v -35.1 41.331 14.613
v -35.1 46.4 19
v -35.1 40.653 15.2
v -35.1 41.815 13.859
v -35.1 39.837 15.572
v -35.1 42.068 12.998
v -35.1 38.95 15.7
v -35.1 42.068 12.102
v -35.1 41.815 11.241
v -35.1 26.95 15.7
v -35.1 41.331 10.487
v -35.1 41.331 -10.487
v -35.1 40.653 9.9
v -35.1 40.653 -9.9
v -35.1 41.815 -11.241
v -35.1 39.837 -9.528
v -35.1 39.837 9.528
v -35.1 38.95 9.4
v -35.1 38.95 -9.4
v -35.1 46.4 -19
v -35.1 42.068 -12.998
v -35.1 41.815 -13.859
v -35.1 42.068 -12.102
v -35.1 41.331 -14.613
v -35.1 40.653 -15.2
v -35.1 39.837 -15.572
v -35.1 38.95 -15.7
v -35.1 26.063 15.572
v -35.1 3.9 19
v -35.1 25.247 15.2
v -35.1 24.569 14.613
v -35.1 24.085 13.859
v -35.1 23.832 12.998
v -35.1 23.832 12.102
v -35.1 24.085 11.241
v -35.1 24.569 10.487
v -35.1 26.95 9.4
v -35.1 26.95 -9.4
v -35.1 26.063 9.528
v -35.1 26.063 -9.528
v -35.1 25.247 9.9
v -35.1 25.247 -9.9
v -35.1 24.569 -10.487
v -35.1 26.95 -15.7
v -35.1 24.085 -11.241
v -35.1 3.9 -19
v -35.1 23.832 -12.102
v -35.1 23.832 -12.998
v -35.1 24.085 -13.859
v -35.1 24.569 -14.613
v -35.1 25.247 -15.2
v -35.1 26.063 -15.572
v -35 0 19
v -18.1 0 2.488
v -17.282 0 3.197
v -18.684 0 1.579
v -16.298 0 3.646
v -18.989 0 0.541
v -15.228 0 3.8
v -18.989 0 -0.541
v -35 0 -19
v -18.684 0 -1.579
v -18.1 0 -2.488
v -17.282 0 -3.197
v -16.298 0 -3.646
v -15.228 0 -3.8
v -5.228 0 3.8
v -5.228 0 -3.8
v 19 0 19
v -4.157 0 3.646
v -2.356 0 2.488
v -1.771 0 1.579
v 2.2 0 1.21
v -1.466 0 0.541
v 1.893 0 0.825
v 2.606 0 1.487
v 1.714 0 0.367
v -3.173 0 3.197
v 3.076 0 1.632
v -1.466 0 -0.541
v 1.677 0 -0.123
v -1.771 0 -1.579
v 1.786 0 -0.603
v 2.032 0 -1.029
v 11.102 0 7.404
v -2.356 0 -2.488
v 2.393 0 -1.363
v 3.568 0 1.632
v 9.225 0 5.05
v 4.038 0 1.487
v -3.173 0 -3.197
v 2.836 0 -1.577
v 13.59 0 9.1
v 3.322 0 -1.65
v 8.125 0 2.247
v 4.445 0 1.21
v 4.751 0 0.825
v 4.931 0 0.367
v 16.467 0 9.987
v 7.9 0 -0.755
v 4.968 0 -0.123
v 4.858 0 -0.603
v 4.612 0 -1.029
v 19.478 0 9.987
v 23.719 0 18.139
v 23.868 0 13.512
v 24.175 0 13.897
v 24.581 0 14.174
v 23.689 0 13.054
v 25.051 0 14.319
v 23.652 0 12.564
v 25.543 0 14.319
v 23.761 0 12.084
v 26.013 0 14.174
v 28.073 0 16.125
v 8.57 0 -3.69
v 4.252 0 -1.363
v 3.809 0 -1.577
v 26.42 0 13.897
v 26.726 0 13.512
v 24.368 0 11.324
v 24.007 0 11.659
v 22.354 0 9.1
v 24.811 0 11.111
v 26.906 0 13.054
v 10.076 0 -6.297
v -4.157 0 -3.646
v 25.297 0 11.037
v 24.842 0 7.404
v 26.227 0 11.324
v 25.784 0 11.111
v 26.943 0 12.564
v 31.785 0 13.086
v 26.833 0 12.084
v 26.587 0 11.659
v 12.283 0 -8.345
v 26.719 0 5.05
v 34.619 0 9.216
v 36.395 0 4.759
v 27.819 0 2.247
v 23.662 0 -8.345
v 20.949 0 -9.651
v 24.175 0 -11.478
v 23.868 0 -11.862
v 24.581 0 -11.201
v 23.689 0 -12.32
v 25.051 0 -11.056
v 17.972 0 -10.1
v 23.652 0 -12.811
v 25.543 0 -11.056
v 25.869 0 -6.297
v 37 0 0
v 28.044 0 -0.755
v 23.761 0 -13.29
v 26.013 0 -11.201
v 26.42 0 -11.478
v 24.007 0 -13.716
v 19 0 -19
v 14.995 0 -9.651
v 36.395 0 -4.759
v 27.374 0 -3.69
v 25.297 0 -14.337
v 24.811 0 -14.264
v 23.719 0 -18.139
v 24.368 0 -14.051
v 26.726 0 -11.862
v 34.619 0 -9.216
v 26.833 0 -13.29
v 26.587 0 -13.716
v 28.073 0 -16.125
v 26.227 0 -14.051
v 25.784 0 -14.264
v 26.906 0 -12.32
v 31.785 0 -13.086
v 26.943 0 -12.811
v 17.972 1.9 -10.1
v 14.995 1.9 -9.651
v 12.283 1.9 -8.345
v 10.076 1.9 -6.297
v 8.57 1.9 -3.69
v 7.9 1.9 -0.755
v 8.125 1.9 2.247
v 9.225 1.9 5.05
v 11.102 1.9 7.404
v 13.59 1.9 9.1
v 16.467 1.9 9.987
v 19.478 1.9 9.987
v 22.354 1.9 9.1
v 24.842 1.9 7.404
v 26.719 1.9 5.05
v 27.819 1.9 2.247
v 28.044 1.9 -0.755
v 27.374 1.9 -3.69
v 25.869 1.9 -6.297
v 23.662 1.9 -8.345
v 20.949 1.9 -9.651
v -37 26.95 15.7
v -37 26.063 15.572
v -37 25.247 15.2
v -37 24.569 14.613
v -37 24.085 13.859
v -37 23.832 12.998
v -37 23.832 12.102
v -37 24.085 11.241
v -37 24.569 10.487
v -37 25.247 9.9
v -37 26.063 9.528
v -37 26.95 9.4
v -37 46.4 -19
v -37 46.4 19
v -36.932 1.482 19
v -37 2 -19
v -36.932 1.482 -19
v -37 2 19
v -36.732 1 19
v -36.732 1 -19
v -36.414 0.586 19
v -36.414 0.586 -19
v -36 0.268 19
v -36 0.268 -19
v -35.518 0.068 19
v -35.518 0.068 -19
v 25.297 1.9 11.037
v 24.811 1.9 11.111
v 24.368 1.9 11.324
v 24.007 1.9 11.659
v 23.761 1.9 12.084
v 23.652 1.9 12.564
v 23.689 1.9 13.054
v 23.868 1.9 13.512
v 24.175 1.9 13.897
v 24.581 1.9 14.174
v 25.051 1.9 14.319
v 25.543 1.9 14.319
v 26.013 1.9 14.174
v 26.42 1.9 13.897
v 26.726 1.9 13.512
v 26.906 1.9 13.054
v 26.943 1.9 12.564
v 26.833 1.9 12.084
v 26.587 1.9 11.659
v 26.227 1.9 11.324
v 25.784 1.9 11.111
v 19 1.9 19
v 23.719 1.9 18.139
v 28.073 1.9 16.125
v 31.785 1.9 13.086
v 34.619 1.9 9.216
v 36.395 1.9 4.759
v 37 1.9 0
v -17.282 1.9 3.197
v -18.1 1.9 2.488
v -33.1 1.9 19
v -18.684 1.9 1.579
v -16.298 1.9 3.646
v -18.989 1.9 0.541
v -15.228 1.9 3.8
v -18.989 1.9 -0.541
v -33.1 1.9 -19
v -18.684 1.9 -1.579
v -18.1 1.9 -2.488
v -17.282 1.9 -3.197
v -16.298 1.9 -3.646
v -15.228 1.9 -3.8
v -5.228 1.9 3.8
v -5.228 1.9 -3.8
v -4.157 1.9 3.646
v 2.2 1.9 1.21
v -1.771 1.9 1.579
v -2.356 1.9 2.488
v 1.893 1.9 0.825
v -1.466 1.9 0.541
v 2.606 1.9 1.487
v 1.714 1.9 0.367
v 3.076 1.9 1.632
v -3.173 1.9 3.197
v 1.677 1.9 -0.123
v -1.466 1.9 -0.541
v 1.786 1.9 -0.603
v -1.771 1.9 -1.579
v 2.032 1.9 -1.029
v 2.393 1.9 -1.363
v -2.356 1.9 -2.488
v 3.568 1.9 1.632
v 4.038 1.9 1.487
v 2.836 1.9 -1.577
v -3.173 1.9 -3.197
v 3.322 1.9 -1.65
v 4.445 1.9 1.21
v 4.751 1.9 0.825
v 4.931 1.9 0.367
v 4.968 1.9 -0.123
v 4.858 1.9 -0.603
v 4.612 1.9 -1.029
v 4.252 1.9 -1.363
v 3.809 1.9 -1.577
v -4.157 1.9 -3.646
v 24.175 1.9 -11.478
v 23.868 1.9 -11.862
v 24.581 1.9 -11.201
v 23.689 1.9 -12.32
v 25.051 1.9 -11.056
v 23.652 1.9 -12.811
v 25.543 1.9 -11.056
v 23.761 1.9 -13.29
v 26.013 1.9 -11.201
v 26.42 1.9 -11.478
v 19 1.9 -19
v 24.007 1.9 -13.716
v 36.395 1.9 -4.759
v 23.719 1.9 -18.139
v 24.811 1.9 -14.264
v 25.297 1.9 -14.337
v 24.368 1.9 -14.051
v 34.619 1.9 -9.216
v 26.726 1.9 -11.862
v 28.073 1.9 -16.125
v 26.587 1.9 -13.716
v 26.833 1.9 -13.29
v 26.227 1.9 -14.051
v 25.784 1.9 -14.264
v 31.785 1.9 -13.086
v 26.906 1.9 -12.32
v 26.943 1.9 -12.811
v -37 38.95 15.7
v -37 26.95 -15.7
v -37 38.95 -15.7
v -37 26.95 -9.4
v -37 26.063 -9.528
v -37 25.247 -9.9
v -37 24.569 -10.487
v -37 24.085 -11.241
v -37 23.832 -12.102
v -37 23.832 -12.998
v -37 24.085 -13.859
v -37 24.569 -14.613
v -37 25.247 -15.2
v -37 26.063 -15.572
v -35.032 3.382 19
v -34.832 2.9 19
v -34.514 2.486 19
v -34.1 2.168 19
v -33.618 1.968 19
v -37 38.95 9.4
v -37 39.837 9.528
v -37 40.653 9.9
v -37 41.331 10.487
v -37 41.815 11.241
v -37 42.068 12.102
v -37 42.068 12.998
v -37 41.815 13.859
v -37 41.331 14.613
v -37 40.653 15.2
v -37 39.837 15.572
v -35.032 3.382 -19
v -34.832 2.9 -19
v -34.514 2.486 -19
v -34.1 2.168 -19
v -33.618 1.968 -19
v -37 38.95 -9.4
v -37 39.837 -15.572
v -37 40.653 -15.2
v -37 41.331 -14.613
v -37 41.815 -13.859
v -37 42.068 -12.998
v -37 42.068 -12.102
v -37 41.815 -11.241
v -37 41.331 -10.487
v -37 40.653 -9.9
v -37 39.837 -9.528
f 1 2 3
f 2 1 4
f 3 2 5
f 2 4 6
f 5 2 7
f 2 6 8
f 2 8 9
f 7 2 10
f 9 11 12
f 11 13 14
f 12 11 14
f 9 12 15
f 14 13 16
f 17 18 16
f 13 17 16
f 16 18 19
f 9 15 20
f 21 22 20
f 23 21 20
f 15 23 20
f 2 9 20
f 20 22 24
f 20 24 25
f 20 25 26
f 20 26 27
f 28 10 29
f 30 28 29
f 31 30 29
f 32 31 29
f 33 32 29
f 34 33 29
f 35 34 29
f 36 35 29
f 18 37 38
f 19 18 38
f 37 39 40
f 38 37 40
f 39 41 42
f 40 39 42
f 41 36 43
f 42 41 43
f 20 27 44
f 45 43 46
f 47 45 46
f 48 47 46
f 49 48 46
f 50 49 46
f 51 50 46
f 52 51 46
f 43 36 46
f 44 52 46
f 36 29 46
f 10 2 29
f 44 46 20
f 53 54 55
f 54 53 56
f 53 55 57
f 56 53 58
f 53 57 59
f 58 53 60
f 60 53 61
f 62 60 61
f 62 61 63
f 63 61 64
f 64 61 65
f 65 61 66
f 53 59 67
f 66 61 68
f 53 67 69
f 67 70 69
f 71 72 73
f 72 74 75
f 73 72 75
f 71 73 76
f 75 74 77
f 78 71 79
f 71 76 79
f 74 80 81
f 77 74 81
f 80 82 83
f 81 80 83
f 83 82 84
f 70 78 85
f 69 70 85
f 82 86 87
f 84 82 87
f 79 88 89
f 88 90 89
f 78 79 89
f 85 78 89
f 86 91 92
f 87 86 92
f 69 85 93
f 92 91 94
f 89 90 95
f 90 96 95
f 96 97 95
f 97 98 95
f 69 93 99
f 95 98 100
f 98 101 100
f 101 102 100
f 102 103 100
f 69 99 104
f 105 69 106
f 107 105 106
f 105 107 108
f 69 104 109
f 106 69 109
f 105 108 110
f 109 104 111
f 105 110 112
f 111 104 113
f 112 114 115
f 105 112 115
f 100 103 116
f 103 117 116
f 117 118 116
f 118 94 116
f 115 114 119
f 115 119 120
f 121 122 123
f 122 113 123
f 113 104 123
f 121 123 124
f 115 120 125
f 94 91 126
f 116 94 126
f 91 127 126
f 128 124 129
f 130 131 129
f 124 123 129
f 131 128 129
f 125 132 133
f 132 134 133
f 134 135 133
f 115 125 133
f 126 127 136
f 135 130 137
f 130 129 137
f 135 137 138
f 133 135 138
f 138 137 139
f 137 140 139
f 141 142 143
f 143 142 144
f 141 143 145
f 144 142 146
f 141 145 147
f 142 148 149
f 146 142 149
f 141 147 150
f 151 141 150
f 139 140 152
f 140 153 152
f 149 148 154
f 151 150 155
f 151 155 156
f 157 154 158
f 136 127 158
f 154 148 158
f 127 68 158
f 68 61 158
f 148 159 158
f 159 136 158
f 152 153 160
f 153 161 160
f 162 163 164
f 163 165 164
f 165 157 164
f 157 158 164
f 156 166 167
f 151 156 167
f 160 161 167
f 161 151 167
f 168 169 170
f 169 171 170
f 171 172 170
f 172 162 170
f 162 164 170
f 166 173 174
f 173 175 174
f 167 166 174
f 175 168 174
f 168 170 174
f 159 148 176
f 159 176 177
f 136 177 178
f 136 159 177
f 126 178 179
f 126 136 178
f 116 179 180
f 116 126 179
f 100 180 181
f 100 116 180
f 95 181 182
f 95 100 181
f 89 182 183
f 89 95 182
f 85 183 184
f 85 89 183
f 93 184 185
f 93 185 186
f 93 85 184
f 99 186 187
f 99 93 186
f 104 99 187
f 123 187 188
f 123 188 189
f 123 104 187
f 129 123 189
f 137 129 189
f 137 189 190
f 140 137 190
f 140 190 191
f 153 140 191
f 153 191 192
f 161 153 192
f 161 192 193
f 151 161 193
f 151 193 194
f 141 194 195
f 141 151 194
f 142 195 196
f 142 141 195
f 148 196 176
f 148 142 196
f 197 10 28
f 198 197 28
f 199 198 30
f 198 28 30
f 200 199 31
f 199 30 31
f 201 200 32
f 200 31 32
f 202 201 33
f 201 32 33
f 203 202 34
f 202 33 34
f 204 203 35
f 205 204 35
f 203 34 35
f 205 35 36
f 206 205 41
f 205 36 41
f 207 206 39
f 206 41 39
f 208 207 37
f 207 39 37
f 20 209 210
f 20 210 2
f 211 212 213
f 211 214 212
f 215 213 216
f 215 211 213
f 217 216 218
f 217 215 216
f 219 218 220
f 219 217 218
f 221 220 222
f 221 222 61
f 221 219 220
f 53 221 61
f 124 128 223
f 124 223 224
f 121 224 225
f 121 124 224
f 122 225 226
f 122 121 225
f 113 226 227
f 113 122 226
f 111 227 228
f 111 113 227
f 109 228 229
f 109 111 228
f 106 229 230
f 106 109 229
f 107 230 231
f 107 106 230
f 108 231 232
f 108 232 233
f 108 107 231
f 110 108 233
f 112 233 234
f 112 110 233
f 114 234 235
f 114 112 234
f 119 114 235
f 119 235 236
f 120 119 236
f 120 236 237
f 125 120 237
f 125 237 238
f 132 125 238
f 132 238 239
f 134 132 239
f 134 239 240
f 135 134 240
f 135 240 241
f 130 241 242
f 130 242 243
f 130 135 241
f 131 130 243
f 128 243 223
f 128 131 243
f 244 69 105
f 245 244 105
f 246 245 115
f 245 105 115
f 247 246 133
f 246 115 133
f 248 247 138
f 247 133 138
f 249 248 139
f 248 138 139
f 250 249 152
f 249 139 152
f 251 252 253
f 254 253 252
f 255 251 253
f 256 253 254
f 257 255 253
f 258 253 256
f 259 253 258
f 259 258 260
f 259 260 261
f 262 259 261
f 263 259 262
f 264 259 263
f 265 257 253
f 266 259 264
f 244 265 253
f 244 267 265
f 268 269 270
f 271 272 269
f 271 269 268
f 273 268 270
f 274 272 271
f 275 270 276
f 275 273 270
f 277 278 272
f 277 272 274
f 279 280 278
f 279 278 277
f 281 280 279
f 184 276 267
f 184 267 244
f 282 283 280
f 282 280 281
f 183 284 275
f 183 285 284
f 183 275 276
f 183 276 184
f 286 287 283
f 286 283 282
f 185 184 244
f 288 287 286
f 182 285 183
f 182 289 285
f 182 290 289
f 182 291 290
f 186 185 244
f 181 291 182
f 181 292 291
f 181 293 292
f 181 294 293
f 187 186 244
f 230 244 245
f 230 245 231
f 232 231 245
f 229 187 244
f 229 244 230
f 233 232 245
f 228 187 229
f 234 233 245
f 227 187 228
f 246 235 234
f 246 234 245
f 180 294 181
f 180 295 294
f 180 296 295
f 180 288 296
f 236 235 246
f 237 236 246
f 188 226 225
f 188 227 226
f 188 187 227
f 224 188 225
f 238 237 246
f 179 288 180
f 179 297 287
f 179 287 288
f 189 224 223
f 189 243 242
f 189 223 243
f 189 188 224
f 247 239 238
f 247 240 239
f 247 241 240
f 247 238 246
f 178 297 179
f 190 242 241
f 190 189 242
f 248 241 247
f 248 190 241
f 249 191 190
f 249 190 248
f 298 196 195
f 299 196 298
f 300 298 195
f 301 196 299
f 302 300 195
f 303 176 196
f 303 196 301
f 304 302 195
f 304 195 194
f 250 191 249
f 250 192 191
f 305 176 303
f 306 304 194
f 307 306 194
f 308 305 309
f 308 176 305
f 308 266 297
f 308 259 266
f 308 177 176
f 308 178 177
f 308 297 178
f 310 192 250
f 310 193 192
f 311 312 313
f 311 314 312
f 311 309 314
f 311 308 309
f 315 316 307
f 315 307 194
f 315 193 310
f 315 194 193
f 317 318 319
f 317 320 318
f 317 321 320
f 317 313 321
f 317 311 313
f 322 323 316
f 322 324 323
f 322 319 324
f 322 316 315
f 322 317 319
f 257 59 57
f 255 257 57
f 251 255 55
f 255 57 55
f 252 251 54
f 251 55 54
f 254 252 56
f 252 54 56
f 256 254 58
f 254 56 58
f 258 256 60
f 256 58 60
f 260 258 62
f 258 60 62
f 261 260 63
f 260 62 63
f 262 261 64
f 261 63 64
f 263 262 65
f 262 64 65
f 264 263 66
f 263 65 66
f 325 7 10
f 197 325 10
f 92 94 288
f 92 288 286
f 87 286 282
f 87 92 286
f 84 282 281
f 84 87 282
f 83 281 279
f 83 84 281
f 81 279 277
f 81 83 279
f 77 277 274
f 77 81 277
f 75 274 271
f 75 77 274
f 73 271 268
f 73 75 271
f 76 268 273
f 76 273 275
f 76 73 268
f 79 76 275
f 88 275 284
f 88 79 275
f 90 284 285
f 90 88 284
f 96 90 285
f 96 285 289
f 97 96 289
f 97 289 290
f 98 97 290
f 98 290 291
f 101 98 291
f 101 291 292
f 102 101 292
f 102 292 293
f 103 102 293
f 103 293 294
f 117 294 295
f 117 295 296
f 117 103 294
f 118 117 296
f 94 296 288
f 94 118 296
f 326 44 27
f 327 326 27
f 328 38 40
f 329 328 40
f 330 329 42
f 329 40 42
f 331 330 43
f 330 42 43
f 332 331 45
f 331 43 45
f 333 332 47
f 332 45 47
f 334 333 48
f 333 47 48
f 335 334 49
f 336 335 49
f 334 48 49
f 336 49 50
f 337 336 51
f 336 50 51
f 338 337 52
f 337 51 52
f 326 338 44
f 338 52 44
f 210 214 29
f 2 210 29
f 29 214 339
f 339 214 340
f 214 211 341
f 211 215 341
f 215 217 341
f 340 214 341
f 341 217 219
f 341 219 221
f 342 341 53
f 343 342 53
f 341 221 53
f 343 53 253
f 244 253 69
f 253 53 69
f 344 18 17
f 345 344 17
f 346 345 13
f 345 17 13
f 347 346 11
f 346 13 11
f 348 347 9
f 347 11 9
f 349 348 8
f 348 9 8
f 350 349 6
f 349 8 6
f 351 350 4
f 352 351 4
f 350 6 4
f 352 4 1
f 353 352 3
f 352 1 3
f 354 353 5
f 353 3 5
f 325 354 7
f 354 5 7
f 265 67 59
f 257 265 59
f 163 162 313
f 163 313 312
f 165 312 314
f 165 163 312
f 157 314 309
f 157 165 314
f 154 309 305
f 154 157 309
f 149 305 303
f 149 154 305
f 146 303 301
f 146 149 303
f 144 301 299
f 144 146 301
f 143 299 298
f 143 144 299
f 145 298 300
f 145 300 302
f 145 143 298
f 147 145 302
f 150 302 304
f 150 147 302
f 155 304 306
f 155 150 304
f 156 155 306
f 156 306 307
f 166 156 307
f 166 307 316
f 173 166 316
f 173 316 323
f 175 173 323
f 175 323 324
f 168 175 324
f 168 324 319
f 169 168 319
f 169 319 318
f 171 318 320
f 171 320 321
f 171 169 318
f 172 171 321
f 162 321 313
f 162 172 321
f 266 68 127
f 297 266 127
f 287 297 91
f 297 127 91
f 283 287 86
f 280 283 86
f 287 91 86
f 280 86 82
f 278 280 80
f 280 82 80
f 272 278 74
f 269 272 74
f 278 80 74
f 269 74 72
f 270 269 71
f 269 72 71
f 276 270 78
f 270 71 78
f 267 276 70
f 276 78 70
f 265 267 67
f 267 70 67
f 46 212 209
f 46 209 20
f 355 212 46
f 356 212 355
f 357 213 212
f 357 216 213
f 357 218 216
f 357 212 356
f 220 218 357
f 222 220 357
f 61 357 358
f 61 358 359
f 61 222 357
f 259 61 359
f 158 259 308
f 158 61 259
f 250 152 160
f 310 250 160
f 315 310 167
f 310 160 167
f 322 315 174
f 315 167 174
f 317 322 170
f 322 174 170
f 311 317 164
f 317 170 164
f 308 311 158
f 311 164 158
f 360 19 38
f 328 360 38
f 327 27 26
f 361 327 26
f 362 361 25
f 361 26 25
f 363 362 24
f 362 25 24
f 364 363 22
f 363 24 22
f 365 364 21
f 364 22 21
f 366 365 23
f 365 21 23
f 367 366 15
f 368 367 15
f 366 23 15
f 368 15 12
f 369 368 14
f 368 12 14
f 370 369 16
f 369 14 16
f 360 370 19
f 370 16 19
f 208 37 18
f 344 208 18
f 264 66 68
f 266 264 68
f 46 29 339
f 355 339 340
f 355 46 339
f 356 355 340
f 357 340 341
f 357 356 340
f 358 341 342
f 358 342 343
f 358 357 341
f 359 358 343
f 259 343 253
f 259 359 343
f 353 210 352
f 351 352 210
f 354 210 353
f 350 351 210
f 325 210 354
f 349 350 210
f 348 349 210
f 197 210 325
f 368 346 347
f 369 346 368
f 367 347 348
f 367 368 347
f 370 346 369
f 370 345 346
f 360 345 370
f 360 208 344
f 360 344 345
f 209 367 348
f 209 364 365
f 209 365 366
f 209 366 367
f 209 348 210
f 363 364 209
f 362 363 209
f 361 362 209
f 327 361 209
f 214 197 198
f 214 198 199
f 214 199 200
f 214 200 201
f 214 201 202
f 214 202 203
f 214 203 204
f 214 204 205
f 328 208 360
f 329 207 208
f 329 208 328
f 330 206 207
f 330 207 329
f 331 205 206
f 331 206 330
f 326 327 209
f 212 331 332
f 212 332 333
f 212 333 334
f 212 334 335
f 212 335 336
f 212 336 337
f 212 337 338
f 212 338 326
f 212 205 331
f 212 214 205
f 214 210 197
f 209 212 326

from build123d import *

# Parameters (mm, degrees)
SKETCH1_R           = 1.65
SKETCH1_R_2         = 10.1
BOSS_EXTRUDE1_DEPTH = 1.9
SKETCH2_W           = 1.9
SKETCH2_H           = 38
BOSS_EXTRUDE2_DEPTH = 44.5
CUT_EXTRUDE1_REACH  = 89.82
FILLET1_R           = 2


with BuildPart() as part:
    # Sketch1 → Boss-Extrude1 (new body)
    with BuildSketch(Plane(origin=(0, 0, 0), x_dir=(1, 0, 0), z_dir=(0, 1, 0))):
        with BuildLine():
            Line((-37, 19), (-37, -19))
            Line((-37, -19), (19, -19))
            ThreePointArc((19, -19), (31.785488519, -13.086252381), (37, -1.44e-07))
            ThreePointArc((37, -1.44e-07), (31.785488618, 13.086252276), (19, 19))
            Line((19, 19), (-37, 19))
        make_face()
        with Locations(Location((25.297222222, -12.687272165, 0), (0, 0, 90))):
            Circle(SKETCH1_R, mode=Mode.SUBTRACT)
        with BuildLine():
            ThreePointArc((-15.227777778, -3.8), (-19.027777778, 0), (-15.227777778, 3.8))
            Line((-15.227777778, 3.8), (-5.227777778, 3.8))
            ThreePointArc((-5.227777778, 3.8), (-1.427777778, 0), (-5.227777778, -3.8))
            Line((-5.227777778, -3.8), (-15.227777778, -3.8))
        make_face(mode=Mode.SUBTRACT)
        with Locations(Location((3.322222222, 0, 0), (0, 0, 90))):
            Circle(SKETCH1_R, mode=Mode.SUBTRACT)
        with Locations(Location((17.972222222, 0, 0), (0, 0, 90))):
            Circle(SKETCH1_R_2, mode=Mode.SUBTRACT)
        with Locations(Location((25.297222222, 12.687272165, 0), (0, 0, 90))):
            Circle(SKETCH1_R, mode=Mode.SUBTRACT)
    extrude(amount=BOSS_EXTRUDE1_DEPTH)

    # Sketch2 → Boss-Extrude2 (add)
    with BuildSketch(Plane(origin=(0, 1.9, 0), x_dir=(1, 0, 0), z_dir=(0, 1, 0))):
        with Locations((-36.05, 0)):
            Rectangle(SKETCH2_W, SKETCH2_H)
    extrude(amount=BOSS_EXTRUDE2_DEPTH)

    # Sketch3 → Cut-Extrude1 (cut, up to next)
    with BuildSketch(Plane(origin=(-35.1, 0, 0), x_dir=(0, 0, -1), z_dir=(1, 0, 0)), mode=Mode.PRIVATE) as cut_extrude1_sk1:
        with BuildLine():
            ThreePointArc((-9.4, 38.95), (-12.55, 42.1), (-15.7, 38.95))
            Line((-15.7, 38.95), (-9.4, 38.95))
        make_face()
    cut_extrude1_tool1 = extrude(cut_extrude1_sk1.sketch, amount=-CUT_EXTRUDE1_REACH, mode=Mode.PRIVATE) & part.part
    # Sketch3 → Cut-Extrude1 (cut, up to next)
    with BuildSketch(Plane(origin=(-35.1, 0, 0), x_dir=(0, 0, -1), z_dir=(1, 0, 0)), mode=Mode.PRIVATE) as cut_extrude1_sk2:
        with BuildLine():
            Line((-9.4, 38.95), (-15.7, 38.95))
            ThreePointArc((-15.7, 38.95), (-12.55, 35.8), (-9.4, 38.95))
        make_face()
    cut_extrude1_tool2 = extrude(cut_extrude1_sk2.sketch, amount=-CUT_EXTRUDE1_REACH, mode=Mode.PRIVATE) & part.part
    # Sketch3 → Cut-Extrude1 (cut, up to next)
    with BuildSketch(Plane(origin=(-35.1, 0, 0), x_dir=(0, 0, -1), z_dir=(1, 0, 0)), mode=Mode.PRIVATE) as cut_extrude1_sk3:
        with BuildLine():
            ThreePointArc((-9.4, 38.95), (-12.55, 42.1), (-15.7, 38.95))
            Line((-15.7, 38.95), (-9.4, 38.95))
        make_face()
    cut_extrude1_tool3 = extrude(cut_extrude1_sk3.sketch, amount=-CUT_EXTRUDE1_REACH, mode=Mode.PRIVATE) & part.part
    # Sketch3 → Cut-Extrude1 (cut, up to next)
    with BuildSketch(Plane(origin=(-35.1, 0, 0), x_dir=(0, 0, -1), z_dir=(1, 0, 0)), mode=Mode.PRIVATE) as cut_extrude1_sk4:
        with BuildLine():
            Line((-9.4, 38.95), (-15.7, 38.95))
            ThreePointArc((-15.7, 38.95), (-12.55, 35.8), (-9.4, 38.95))
        make_face()
    cut_extrude1_tool4 = extrude(cut_extrude1_sk4.sketch, amount=-CUT_EXTRUDE1_REACH, mode=Mode.PRIVATE) & part.part
    # Sketch3 → Cut-Extrude1 (cut, up to next)
    with BuildSketch(Plane(origin=(-35.1, 0, 0), x_dir=(0, 0, -1), z_dir=(1, 0, 0)), mode=Mode.PRIVATE) as cut_extrude1_sk5:
        with BuildLine():
            Line((-15.7, 38.95), (-15.7, 26.95))
            ThreePointArc((-15.7, 26.95), (-12.55, 30.1), (-9.4, 26.95))
            Line((-9.4, 26.95), (-9.4, 38.95))
            ThreePointArc((-9.4, 38.95), (-12.55, 35.8), (-15.7, 38.95))
        make_face()
    cut_extrude1_tool5 = extrude(cut_extrude1_sk5.sketch, amount=-CUT_EXTRUDE1_REACH, mode=Mode.PRIVATE) & part.part
    # Sketch3 → Cut-Extrude1 (cut, up to next)
    with BuildSketch(Plane(origin=(-35.1, 0, 0), x_dir=(0, 0, -1), z_dir=(1, 0, 0)), mode=Mode.PRIVATE) as cut_extrude1_sk6:
        with BuildLine():
            ThreePointArc((-9.4, 26.95), (-12.55, 30.1), (-15.7, 26.95))
            Line((-15.7, 26.95), (-9.4, 26.95))
        make_face()
    cut_extrude1_tool6 = extrude(cut_extrude1_sk6.sketch, amount=-CUT_EXTRUDE1_REACH, mode=Mode.PRIVATE) & part.part
    # Sketch3 → Cut-Extrude1 (cut, up to next)
    with BuildSketch(Plane(origin=(-35.1, 0, 0), x_dir=(0, 0, -1), z_dir=(1, 0, 0)), mode=Mode.PRIVATE) as cut_extrude1_sk7:
        with BuildLine():
            Line((-9.4, 26.95), (-15.7, 26.95))
            ThreePointArc((-15.7, 26.95), (-12.55, 23.8), (-9.4, 26.95))
        make_face()
    cut_extrude1_tool7 = extrude(cut_extrude1_sk7.sketch, amount=-CUT_EXTRUDE1_REACH, mode=Mode.PRIVATE) & part.part
    # Sketch3 → Cut-Extrude1 (cut, up to next)
    with BuildSketch(Plane(origin=(-35.1, 0, 0), x_dir=(0, 0, -1), z_dir=(1, 0, 0)), mode=Mode.PRIVATE) as cut_extrude1_sk8:
        with BuildLine():
            Line((9.4, 38.95), (9.4, 26.95))
            ThreePointArc((9.4, 26.95), (12.55, 30.1), (15.7, 26.95))
            Line((15.7, 26.95), (15.7, 38.95))
            ThreePointArc((15.7, 38.95), (12.55, 35.8), (9.4, 38.95))
        make_face()
    cut_extrude1_tool8 = extrude(cut_extrude1_sk8.sketch, amount=-CUT_EXTRUDE1_REACH, mode=Mode.PRIVATE) & part.part
    # Sketch3 → Cut-Extrude1 (cut, up to next)
    with BuildSketch(Plane(origin=(-35.1, 0, 0), x_dir=(0, 0, -1), z_dir=(1, 0, 0)), mode=Mode.PRIVATE) as cut_extrude1_sk9:
        with BuildLine():
            ThreePointArc((15.7, 38.95), (12.55, 42.1), (9.4, 38.95))
            Line((9.4, 38.95), (15.7, 38.95))
        make_face()
    cut_extrude1_tool9 = extrude(cut_extrude1_sk9.sketch, amount=-CUT_EXTRUDE1_REACH, mode=Mode.PRIVATE) & part.part
    # Sketch3 → Cut-Extrude1 (cut, up to next)
    with BuildSketch(Plane(origin=(-35.1, 0, 0), x_dir=(0, 0, -1), z_dir=(1, 0, 0)), mode=Mode.PRIVATE) as cut_extrude1_sk10:
        with BuildLine():
            Line((15.7, 38.95), (9.4, 38.95))
            ThreePointArc((9.4, 38.95), (12.55, 35.8), (15.7, 38.95))
        make_face()
    cut_extrude1_tool10 = extrude(cut_extrude1_sk10.sketch, amount=-CUT_EXTRUDE1_REACH, mode=Mode.PRIVATE) & part.part
    # Sketch3 → Cut-Extrude1 (cut, up to next)
    with BuildSketch(Plane(origin=(-35.1, 0, 0), x_dir=(0, 0, -1), z_dir=(1, 0, 0)), mode=Mode.PRIVATE) as cut_extrude1_sk11:
        with BuildLine():
            ThreePointArc((15.7, 38.95), (12.55, 42.1), (9.4, 38.95))
            Line((9.4, 38.95), (15.7, 38.95))
        make_face()
    cut_extrude1_tool11 = extrude(cut_extrude1_sk11.sketch, amount=-CUT_EXTRUDE1_REACH, mode=Mode.PRIVATE) & part.part
    # Sketch3 → Cut-Extrude1 (cut, up to next)
    with BuildSketch(Plane(origin=(-35.1, 0, 0), x_dir=(0, 0, -1), z_dir=(1, 0, 0)), mode=Mode.PRIVATE) as cut_extrude1_sk12:
        with BuildLine():
            Line((15.7, 38.95), (9.4, 38.95))
            ThreePointArc((9.4, 38.95), (12.55, 35.8), (15.7, 38.95))
        make_face()
    cut_extrude1_tool12 = extrude(cut_extrude1_sk12.sketch, amount=-CUT_EXTRUDE1_REACH, mode=Mode.PRIVATE) & part.part
    # Sketch3 → Cut-Extrude1 (cut, up to next)
    with BuildSketch(Plane(origin=(-35.1, 0, 0), x_dir=(0, 0, -1), z_dir=(1, 0, 0)), mode=Mode.PRIVATE) as cut_extrude1_sk13:
        with BuildLine():
            ThreePointArc((15.7, 26.95), (12.55, 30.1), (9.4, 26.95))
            Line((9.4, 26.95), (15.7, 26.95))
        make_face()
    cut_extrude1_tool13 = extrude(cut_extrude1_sk13.sketch, amount=-CUT_EXTRUDE1_REACH, mode=Mode.PRIVATE) & part.part
    # Sketch3 → Cut-Extrude1 (cut, up to next)
    with BuildSketch(Plane(origin=(-35.1, 0, 0), x_dir=(0, 0, -1), z_dir=(1, 0, 0)), mode=Mode.PRIVATE) as cut_extrude1_sk14:
        with BuildLine():
            Line((15.7, 26.95), (9.4, 26.95))
            ThreePointArc((9.4, 26.95), (12.55, 23.8), (15.7, 26.95))
        make_face()
    cut_extrude1_tool14 = extrude(cut_extrude1_sk14.sketch, amount=-CUT_EXTRUDE1_REACH, mode=Mode.PRIVATE) & part.part
    # Sketch3 → Cut-Extrude1 (cut, up to next)
    with BuildSketch(Plane(origin=(-35.1, 0, 0), x_dir=(0, 0, -1), z_dir=(1, 0, 0)), mode=Mode.PRIVATE) as cut_extrude1_sk15:
        with BuildLine():
            ThreePointArc((15.7, 26.95), (12.55, 30.1), (9.4, 26.95))
            Line((9.4, 26.95), (15.7, 26.95))
        make_face()
    cut_extrude1_tool15 = extrude(cut_extrude1_sk15.sketch, amount=-CUT_EXTRUDE1_REACH, mode=Mode.PRIVATE) & part.part
    # Sketch3 → Cut-Extrude1 (cut, up to next)
    with BuildSketch(Plane(origin=(-35.1, 0, 0), x_dir=(0, 0, -1), z_dir=(1, 0, 0)), mode=Mode.PRIVATE) as cut_extrude1_sk16:
        with BuildLine():
            Line((15.7, 26.95), (9.4, 26.95))
            ThreePointArc((9.4, 26.95), (12.55, 23.8), (15.7, 26.95))
        make_face()
    cut_extrude1_tool16 = extrude(cut_extrude1_sk16.sketch, amount=-CUT_EXTRUDE1_REACH, mode=Mode.PRIVATE) & part.part
    # Sketch3 → Cut-Extrude1 (cut, up to next)
    with BuildSketch(Plane(origin=(-35.1, 0, 0), x_dir=(0, 0, -1), z_dir=(1, 0, 0)), mode=Mode.PRIVATE) as cut_extrude1_sk17:
        with BuildLine():
            ThreePointArc((-9.4, 26.95), (-12.55, 30.1), (-15.7, 26.95))
            Line((-15.7, 26.95), (-9.4, 26.95))
        make_face()
    cut_extrude1_tool17 = extrude(cut_extrude1_sk17.sketch, amount=-CUT_EXTRUDE1_REACH, mode=Mode.PRIVATE) & part.part
    # Sketch3 → Cut-Extrude1 (cut, up to next)
    with BuildSketch(Plane(origin=(-35.1, 0, 0), x_dir=(0, 0, -1), z_dir=(1, 0, 0)), mode=Mode.PRIVATE) as cut_extrude1_sk18:
        with BuildLine():
            Line((-9.4, 26.95), (-15.7, 26.95))
            ThreePointArc((-15.7, 26.95), (-12.55, 23.8), (-9.4, 26.95))
        make_face()
    cut_extrude1_tool18 = extrude(cut_extrude1_sk18.sketch, amount=-CUT_EXTRUDE1_REACH, mode=Mode.PRIVATE) & part.part
    add(cut_extrude1_tool1.solids().sort_by_distance((-35.1, 40.286902, 12.55))[0], mode=Mode.SUBTRACT)
    add(cut_extrude1_tool2.solids().sort_by_distance((-35.1, 37.613098, 12.55))[0], mode=Mode.SUBTRACT)
    add(cut_extrude1_tool3.solids().sort_by_distance((-35.1, 40.286902, 12.55))[0], mode=Mode.SUBTRACT)
    add(cut_extrude1_tool4.solids().sort_by_distance((-35.1, 37.613098, 12.55))[0], mode=Mode.SUBTRACT)
    add(cut_extrude1_tool5.solids().sort_by_distance((-35.1, 32.95, 12.55))[0], mode=Mode.SUBTRACT)
    add(cut_extrude1_tool6.solids().sort_by_distance((-35.1, 28.286902, 12.55))[0], mode=Mode.SUBTRACT)
    add(cut_extrude1_tool7.solids().sort_by_distance((-35.1, 25.613098, 12.55))[0], mode=Mode.SUBTRACT)
    add(cut_extrude1_tool8.solids().sort_by_distance((-35.1, 32.95, -12.55))[0], mode=Mode.SUBTRACT)
    add(cut_extrude1_tool9.solids().sort_by_distance((-35.1, 40.286902, -12.55))[0], mode=Mode.SUBTRACT)
    add(cut_extrude1_tool10.solids().sort_by_distance((-35.1, 37.613098, -12.55))[0], mode=Mode.SUBTRACT)
    add(cut_extrude1_tool11.solids().sort_by_distance((-35.1, 40.286902, -12.55))[0], mode=Mode.SUBTRACT)
    add(cut_extrude1_tool12.solids().sort_by_distance((-35.1, 37.613098, -12.55))[0], mode=Mode.SUBTRACT)
    add(cut_extrude1_tool13.solids().sort_by_distance((-35.1, 28.286902, -12.55))[0], mode=Mode.SUBTRACT)
    add(cut_extrude1_tool14.solids().sort_by_distance((-35.1, 25.613098, -12.55))[0], mode=Mode.SUBTRACT)
    add(cut_extrude1_tool15.solids().sort_by_distance((-35.1, 28.286902, -12.55))[0], mode=Mode.SUBTRACT)
    add(cut_extrude1_tool16.solids().sort_by_distance((-35.1, 25.613098, -12.55))[0], mode=Mode.SUBTRACT)
    add(cut_extrude1_tool17.solids().sort_by_distance((-35.1, 28.286902, 12.55))[0], mode=Mode.SUBTRACT)
    add(cut_extrude1_tool18.solids().sort_by_distance((-35.1, 25.613098, 12.55))[0], mode=Mode.SUBTRACT)

    # Fillet1
    fillet1_edges = [part.edges().sort_by_distance(p)[0] for p in [
        (-37, 0, 0),
        (-35.1, 1.9, 0),
    ]]
    fillet(fillet1_edges, radius=FILLET1_R)


solid = part.part
